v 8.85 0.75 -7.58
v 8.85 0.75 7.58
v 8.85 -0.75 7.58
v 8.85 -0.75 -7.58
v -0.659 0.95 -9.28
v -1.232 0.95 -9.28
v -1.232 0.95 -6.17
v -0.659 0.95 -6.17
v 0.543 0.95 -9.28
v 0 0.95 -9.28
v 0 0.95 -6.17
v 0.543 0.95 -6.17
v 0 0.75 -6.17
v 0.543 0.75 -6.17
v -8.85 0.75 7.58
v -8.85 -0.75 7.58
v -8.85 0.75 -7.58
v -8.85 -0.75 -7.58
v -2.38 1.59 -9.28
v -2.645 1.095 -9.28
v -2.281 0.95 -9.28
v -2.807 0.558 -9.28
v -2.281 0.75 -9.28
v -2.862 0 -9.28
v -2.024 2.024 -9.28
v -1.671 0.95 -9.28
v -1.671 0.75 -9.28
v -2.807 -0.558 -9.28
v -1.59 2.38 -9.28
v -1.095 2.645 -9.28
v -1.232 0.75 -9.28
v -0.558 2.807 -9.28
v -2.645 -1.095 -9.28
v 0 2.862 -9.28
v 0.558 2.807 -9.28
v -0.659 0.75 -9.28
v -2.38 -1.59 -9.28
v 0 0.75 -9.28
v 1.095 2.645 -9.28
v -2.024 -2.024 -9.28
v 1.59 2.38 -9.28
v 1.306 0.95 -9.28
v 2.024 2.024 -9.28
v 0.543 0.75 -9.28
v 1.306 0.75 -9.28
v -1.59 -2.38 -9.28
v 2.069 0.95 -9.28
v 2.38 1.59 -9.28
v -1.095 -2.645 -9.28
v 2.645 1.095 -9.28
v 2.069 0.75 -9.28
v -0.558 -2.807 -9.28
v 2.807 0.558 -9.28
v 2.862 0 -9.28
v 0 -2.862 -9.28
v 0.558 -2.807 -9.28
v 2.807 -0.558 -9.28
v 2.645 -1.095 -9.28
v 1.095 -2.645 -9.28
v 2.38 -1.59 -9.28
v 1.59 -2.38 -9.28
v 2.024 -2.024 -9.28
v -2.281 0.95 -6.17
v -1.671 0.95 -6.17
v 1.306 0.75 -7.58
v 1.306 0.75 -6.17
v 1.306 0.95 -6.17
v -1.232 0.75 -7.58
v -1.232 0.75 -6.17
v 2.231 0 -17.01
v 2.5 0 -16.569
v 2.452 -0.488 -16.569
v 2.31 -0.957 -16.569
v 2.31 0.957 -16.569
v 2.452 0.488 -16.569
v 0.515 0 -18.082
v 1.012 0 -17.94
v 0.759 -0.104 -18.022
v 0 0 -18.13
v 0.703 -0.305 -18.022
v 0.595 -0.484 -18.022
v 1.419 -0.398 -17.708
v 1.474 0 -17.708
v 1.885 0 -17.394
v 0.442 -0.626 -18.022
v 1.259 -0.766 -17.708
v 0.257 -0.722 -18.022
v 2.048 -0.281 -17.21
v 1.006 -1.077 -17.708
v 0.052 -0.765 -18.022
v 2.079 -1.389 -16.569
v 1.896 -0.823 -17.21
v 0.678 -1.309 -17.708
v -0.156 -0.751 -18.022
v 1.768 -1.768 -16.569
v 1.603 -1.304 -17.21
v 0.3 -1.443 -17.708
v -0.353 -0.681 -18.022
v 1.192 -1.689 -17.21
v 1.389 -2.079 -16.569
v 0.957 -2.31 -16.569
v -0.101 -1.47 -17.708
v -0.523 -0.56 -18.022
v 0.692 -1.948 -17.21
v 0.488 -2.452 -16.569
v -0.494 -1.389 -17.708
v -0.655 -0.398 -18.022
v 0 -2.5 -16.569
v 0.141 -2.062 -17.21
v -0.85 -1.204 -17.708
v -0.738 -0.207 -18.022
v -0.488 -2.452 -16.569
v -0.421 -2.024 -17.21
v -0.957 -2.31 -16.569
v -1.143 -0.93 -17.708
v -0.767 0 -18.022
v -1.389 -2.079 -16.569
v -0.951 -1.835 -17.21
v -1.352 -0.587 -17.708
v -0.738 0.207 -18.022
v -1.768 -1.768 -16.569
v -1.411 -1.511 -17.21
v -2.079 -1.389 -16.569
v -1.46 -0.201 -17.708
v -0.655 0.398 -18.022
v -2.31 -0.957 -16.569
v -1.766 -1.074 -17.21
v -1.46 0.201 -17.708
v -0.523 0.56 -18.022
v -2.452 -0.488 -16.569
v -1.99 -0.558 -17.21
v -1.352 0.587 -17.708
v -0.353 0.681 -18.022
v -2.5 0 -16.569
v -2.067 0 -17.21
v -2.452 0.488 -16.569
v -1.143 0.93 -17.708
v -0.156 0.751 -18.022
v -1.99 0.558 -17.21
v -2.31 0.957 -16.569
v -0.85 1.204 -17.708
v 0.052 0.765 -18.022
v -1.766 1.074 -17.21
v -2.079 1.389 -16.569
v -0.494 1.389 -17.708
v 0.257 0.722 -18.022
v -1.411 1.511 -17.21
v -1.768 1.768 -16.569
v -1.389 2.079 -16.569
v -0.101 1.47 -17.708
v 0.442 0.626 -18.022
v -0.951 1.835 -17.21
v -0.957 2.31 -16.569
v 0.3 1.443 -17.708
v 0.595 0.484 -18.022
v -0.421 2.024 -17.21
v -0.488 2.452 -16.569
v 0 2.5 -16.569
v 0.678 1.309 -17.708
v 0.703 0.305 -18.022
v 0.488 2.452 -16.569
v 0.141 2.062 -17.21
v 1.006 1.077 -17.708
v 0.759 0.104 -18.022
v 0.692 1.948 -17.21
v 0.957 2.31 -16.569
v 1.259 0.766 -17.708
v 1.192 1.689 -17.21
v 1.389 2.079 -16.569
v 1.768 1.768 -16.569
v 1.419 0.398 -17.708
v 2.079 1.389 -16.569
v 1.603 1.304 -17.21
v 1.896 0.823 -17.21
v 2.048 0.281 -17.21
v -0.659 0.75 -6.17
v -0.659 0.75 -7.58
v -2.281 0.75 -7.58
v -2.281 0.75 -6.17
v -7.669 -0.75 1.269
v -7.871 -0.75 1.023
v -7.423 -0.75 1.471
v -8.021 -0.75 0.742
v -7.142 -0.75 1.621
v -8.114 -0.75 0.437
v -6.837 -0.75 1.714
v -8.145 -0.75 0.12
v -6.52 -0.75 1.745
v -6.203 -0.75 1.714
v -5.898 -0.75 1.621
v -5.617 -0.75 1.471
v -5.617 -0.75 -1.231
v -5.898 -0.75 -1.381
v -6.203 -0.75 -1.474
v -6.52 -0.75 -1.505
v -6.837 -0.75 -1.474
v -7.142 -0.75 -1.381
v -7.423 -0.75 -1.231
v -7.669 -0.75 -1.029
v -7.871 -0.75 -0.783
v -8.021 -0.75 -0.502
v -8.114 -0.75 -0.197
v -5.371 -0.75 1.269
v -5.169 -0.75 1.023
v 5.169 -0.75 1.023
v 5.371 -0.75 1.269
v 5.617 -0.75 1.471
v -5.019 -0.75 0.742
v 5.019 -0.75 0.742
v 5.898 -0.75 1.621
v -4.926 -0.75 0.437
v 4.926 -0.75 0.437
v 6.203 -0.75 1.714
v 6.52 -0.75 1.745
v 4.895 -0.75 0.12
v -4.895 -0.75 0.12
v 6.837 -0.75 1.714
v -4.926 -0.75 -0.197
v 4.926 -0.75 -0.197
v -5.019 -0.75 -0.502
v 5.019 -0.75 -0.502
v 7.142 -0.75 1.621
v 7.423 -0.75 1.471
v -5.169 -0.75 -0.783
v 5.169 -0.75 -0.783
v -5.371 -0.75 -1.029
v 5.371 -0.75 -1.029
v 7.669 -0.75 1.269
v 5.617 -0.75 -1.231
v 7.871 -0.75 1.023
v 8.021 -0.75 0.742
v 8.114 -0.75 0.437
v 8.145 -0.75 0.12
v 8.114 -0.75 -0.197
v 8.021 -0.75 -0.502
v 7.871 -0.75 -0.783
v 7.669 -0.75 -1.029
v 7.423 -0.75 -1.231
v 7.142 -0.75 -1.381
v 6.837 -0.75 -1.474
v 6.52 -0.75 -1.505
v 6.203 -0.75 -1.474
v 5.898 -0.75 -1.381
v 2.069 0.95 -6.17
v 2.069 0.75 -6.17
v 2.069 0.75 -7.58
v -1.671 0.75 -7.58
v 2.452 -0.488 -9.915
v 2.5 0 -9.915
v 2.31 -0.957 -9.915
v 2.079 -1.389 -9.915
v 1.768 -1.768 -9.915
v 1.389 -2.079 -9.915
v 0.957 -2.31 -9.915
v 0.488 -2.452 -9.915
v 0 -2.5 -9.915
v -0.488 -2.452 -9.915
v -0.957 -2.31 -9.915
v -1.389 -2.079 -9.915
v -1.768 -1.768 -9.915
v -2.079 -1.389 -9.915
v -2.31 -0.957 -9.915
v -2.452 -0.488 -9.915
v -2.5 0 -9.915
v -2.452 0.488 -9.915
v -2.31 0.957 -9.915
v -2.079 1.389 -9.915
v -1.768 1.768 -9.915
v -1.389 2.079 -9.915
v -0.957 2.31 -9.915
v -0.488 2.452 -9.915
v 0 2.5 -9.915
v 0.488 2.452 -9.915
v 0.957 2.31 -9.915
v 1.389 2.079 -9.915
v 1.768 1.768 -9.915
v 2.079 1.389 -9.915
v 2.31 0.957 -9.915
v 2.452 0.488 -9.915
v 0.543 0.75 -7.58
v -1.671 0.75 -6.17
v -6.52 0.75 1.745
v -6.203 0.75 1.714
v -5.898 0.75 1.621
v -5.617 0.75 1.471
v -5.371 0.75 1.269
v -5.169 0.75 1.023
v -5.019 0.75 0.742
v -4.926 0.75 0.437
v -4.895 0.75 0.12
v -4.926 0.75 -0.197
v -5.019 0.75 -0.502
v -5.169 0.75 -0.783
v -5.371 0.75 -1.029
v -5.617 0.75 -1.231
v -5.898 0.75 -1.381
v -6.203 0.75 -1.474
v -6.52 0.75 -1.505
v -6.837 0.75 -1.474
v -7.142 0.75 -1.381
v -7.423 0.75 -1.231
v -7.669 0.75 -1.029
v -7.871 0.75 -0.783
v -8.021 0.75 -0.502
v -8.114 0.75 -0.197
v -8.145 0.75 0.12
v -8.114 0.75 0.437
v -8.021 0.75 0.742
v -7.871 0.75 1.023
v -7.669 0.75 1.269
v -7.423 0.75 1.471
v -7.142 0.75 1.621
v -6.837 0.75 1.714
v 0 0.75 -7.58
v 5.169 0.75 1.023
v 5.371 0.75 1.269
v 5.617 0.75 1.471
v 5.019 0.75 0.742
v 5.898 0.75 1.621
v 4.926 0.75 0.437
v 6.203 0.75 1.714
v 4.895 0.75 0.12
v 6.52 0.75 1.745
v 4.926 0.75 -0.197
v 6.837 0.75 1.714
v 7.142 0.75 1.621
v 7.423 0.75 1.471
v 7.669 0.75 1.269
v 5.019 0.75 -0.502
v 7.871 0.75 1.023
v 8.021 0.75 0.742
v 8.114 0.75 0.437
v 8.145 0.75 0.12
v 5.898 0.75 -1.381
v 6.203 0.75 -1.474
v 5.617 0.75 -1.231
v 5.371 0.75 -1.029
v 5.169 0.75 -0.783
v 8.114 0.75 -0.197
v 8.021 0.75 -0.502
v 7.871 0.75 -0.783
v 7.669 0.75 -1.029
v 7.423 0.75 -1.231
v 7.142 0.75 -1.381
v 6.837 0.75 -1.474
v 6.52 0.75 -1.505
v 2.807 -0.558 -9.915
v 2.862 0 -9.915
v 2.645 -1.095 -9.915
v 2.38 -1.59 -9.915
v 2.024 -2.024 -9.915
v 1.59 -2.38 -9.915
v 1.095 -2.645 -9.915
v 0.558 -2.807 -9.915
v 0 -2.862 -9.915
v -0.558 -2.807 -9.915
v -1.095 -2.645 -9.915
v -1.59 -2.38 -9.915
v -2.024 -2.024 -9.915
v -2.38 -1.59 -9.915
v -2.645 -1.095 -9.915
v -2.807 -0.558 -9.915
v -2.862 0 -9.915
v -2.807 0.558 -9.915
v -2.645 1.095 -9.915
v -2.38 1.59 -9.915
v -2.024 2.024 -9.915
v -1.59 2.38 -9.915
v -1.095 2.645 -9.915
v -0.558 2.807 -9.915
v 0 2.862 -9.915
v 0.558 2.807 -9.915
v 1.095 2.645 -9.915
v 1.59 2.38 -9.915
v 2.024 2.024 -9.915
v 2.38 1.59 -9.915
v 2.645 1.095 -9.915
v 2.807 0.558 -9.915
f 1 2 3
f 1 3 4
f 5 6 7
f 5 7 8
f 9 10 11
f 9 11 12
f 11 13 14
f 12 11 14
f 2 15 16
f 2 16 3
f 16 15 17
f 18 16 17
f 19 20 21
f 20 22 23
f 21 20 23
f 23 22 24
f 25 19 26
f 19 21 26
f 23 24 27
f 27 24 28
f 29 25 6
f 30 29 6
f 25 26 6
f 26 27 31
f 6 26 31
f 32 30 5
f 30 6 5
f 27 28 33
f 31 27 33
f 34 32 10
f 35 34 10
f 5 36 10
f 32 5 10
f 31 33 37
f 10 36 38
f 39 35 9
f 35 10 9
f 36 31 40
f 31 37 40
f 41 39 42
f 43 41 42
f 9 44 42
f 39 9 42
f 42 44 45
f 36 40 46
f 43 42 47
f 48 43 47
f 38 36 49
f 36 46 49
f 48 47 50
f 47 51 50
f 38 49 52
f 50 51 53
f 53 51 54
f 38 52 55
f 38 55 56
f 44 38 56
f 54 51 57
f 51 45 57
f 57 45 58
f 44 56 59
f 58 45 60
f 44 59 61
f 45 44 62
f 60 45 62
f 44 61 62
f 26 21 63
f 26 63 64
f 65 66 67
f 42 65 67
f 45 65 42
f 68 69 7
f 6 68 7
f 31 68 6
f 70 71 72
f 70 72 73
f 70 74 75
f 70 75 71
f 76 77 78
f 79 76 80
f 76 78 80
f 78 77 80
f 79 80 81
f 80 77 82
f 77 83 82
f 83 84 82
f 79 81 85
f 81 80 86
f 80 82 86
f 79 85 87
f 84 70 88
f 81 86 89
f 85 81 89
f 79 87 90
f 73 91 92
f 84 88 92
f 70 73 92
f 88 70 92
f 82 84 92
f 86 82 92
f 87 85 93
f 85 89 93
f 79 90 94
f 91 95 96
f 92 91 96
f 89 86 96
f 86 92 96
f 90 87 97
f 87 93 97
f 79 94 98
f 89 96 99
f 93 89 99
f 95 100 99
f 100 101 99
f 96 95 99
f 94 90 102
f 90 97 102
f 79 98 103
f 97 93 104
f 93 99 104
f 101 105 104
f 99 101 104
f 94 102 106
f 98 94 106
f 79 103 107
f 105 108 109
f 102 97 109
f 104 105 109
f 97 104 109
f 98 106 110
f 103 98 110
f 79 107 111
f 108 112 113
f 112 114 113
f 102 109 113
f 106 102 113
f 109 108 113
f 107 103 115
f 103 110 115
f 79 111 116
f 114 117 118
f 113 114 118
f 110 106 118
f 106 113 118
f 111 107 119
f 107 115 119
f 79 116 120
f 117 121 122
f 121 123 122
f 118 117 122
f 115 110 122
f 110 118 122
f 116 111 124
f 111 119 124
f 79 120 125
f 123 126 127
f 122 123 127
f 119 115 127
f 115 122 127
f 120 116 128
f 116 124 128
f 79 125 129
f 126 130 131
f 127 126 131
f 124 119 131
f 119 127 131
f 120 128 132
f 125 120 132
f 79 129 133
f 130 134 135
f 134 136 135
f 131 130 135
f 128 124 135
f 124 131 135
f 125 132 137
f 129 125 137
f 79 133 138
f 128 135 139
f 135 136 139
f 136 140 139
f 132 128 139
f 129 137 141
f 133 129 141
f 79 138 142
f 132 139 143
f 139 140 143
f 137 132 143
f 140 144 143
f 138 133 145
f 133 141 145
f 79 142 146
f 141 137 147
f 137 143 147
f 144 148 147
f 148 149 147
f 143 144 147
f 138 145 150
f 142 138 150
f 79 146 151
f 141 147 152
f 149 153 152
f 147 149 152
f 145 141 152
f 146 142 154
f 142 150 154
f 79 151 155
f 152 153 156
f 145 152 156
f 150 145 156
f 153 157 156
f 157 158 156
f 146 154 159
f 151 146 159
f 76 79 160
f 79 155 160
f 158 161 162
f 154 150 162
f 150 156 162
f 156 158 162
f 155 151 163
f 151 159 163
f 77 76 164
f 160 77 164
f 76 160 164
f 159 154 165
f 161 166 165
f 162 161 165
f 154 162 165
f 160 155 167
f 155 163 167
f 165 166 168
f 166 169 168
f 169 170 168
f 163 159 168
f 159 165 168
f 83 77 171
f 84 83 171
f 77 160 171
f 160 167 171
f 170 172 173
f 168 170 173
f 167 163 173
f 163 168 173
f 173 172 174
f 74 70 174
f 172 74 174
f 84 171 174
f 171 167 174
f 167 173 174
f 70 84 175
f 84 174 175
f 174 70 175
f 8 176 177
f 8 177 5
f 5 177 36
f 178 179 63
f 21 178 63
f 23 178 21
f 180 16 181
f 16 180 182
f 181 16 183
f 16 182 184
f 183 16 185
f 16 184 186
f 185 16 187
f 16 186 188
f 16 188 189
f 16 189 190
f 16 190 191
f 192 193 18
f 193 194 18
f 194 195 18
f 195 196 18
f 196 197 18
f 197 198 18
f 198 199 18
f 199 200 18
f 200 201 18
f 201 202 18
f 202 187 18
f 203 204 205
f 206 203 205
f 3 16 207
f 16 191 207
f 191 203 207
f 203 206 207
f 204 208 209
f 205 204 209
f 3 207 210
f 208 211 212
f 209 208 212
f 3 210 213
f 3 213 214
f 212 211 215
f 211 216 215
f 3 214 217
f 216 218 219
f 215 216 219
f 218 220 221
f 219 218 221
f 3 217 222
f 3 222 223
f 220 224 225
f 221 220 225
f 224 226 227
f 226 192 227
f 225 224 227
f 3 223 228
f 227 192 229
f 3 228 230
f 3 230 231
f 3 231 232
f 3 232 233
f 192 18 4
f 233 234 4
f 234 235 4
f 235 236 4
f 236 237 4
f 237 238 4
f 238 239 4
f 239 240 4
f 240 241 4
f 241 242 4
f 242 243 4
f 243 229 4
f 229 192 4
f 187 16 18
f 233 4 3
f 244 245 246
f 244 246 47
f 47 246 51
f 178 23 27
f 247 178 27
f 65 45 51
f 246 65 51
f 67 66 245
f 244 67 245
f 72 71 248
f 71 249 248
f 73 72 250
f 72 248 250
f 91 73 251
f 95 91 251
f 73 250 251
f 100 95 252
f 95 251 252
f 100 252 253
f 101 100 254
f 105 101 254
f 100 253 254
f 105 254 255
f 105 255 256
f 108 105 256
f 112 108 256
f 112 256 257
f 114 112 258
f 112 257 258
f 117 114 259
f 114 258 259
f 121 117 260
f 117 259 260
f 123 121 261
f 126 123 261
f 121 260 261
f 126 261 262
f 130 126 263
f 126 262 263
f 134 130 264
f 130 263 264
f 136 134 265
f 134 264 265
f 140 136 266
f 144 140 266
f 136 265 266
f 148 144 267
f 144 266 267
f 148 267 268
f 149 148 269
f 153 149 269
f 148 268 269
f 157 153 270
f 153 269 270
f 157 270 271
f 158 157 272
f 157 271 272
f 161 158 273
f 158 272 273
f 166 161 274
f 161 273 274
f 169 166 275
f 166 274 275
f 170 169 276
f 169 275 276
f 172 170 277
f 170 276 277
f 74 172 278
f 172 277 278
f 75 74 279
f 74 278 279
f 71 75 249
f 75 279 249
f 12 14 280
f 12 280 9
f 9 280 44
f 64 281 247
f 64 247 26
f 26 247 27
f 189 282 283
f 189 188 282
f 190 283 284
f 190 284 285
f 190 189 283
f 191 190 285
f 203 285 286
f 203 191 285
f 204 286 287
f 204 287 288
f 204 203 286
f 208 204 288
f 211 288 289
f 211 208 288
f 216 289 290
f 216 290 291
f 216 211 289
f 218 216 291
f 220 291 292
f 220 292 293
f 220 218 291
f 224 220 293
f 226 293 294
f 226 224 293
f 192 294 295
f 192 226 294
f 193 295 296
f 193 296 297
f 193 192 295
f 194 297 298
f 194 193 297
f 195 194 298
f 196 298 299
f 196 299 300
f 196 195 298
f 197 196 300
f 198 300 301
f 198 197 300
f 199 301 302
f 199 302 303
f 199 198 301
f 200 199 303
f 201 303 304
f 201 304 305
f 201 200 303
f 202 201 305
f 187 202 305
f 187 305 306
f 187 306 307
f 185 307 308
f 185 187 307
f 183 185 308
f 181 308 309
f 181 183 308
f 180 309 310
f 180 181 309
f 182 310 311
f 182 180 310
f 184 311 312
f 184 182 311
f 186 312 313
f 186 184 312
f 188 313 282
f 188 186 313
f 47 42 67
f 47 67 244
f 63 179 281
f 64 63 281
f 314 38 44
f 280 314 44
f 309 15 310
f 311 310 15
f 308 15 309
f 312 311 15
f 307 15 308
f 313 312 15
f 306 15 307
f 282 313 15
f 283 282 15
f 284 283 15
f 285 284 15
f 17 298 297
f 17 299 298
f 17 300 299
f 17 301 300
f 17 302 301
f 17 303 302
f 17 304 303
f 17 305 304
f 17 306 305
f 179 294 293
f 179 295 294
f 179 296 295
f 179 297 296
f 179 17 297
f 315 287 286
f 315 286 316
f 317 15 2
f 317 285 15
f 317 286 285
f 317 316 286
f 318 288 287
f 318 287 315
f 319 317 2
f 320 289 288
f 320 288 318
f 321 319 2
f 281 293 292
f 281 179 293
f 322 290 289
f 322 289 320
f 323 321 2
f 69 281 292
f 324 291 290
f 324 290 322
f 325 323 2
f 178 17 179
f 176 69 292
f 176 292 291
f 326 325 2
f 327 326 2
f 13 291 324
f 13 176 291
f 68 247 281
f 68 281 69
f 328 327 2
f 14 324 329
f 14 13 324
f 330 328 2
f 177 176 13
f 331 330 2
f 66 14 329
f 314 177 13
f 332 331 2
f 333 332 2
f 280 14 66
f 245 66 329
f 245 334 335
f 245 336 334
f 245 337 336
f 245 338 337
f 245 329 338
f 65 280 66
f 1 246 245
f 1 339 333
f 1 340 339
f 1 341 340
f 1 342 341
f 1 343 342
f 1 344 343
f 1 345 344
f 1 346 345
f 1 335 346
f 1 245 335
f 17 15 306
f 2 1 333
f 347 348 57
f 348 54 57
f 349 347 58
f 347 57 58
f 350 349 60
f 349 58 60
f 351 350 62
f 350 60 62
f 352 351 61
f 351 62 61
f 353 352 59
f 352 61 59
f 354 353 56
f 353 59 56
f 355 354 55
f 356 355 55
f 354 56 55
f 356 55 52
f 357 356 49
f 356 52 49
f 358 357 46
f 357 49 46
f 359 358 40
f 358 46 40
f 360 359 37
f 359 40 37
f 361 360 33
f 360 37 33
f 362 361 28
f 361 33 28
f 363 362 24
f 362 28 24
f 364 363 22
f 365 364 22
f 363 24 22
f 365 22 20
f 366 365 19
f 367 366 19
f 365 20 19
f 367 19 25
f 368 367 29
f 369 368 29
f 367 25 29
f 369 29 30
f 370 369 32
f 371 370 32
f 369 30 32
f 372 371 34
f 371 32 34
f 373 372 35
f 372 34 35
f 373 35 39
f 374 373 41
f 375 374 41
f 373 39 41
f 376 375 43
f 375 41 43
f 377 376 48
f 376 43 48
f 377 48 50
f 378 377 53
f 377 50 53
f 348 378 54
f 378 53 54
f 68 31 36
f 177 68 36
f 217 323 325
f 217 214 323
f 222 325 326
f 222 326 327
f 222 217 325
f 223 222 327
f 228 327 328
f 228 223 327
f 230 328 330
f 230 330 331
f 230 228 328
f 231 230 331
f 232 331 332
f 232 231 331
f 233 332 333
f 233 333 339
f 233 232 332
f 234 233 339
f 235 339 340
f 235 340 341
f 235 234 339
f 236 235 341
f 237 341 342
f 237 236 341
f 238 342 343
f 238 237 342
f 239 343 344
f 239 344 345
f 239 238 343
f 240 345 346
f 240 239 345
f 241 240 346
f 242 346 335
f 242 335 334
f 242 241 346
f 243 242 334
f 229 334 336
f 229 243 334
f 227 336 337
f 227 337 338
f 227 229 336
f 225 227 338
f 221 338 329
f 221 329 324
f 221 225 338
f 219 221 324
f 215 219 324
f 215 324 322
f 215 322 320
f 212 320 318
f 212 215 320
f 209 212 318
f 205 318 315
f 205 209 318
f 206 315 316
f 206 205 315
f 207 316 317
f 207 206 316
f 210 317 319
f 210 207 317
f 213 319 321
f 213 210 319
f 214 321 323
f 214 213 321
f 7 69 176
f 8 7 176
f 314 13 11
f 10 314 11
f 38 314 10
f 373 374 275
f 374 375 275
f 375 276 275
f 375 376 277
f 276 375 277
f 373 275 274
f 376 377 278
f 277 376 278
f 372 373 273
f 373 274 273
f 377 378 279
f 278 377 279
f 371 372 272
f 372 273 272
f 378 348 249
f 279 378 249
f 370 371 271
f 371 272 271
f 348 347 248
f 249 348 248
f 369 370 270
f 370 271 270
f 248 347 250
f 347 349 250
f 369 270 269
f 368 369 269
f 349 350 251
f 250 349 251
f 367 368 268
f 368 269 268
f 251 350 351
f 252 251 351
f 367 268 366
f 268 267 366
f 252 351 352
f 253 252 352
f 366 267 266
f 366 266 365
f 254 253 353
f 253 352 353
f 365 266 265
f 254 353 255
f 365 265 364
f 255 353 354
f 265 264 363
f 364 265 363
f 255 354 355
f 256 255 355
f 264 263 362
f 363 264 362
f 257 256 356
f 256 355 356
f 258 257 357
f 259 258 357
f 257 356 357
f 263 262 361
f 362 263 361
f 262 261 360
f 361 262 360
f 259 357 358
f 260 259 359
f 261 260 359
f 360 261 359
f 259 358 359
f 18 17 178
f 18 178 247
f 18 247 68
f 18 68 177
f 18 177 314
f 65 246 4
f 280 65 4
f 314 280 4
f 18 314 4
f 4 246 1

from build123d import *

# Parameters (mm, degrees)
SKETCH1_W           = 17.7
SKETCH1_H           = 15.16
SKETCH1_R           = 1.625
BOSS_EXTRUDE1_DEPTH = 0.75
SKETCH3_W           = 0.610582996
SKETCH3_H           = 3.110461755
SKETCH3_W_2         = 0.572421558
SKETCH3_W_3         = 0.542718384
SKETCH3_W_4         = 0.763228744
BOSS_EXTRUDE2_DEPTH = 0.2


with BuildPart() as part:
    # Sketch1 → Boss-Extrude1 (new, symmetric)
    with BuildSketch(Plane(origin=(0, 0, 0), x_dir=(1, 0, 0), z_dir=(0, 1, 0))):
        Rectangle(SKETCH1_W, SKETCH1_H)
        with Locations(Location((-6.52, -0.12, 0), (0, 0, 270))):
            Circle(SKETCH1_R, mode=Mode.SUBTRACT)
        with Locations(Location((6.52, -0.12, 0), (0, 0, 270))):
            Circle(SKETCH1_R, mode=Mode.SUBTRACT)
    extrude(amount=BOSS_EXTRUDE1_DEPTH, both=True)



with BuildPart() as body_2:
    # Sketch2 → Revolve1 (revolve)
    with BuildSketch(Plane(origin=(0, 0, 0), x_dir=(1, 0, 0), z_dir=(0, 1, 0)), mode=Mode.PRIVATE) as revolve1_sk:
        with BuildLine():
            Line((0, 9.28), (0, 18.13))
            ThreePointArc((0, 18.13), (-1.473784577, 17.707559711), (-2.499995, 16.568529884))
            Line((-2.499995, 16.568529884), (-2.499995, 9.914637604))
            Line((-2.499995, 9.914637604), (-2.862499587, 9.914637604))
            Line((-2.862499587, 9.914637604), (-2.862499587, 9.28))
            Line((-2.862499587, 9.28), (0, 9.28))
        make_face()
    revolve(revolve1_sk.sketch.rotate(Axis((0, 0, 0), (0, 0, -1)), 180), axis=Axis((0, 0, 0), (0, 0, -1)))


with BuildPart() as part_1:
    add(part.part)

    add(body_2.part)  # Boss-Extrude2 merges body 2
    # Sketch3 → Boss-Extrude2 (add)
    with BuildSketch(Plane(origin=(0, 0.75, 0), x_dir=(1, 0, 0), z_dir=(0, 1, 0))):
        with Locations((-1.975936472, 7.724769123)):
            Rectangle(SKETCH3_W, SKETCH3_H)
        with Locations((-0.945577667, 7.724769123)):
            Rectangle(SKETCH3_W_2, SKETCH3_H)
        with Locations((0.271359192, 7.724769123)):
            Rectangle(SKETCH3_W_3, SKETCH3_H)
        with Locations((1.6875615, 7.724769123)):
            Rectangle(SKETCH3_W_4, SKETCH3_H)
    extrude(amount=BOSS_EXTRUDE2_DEPTH)


solid = part_1.part
